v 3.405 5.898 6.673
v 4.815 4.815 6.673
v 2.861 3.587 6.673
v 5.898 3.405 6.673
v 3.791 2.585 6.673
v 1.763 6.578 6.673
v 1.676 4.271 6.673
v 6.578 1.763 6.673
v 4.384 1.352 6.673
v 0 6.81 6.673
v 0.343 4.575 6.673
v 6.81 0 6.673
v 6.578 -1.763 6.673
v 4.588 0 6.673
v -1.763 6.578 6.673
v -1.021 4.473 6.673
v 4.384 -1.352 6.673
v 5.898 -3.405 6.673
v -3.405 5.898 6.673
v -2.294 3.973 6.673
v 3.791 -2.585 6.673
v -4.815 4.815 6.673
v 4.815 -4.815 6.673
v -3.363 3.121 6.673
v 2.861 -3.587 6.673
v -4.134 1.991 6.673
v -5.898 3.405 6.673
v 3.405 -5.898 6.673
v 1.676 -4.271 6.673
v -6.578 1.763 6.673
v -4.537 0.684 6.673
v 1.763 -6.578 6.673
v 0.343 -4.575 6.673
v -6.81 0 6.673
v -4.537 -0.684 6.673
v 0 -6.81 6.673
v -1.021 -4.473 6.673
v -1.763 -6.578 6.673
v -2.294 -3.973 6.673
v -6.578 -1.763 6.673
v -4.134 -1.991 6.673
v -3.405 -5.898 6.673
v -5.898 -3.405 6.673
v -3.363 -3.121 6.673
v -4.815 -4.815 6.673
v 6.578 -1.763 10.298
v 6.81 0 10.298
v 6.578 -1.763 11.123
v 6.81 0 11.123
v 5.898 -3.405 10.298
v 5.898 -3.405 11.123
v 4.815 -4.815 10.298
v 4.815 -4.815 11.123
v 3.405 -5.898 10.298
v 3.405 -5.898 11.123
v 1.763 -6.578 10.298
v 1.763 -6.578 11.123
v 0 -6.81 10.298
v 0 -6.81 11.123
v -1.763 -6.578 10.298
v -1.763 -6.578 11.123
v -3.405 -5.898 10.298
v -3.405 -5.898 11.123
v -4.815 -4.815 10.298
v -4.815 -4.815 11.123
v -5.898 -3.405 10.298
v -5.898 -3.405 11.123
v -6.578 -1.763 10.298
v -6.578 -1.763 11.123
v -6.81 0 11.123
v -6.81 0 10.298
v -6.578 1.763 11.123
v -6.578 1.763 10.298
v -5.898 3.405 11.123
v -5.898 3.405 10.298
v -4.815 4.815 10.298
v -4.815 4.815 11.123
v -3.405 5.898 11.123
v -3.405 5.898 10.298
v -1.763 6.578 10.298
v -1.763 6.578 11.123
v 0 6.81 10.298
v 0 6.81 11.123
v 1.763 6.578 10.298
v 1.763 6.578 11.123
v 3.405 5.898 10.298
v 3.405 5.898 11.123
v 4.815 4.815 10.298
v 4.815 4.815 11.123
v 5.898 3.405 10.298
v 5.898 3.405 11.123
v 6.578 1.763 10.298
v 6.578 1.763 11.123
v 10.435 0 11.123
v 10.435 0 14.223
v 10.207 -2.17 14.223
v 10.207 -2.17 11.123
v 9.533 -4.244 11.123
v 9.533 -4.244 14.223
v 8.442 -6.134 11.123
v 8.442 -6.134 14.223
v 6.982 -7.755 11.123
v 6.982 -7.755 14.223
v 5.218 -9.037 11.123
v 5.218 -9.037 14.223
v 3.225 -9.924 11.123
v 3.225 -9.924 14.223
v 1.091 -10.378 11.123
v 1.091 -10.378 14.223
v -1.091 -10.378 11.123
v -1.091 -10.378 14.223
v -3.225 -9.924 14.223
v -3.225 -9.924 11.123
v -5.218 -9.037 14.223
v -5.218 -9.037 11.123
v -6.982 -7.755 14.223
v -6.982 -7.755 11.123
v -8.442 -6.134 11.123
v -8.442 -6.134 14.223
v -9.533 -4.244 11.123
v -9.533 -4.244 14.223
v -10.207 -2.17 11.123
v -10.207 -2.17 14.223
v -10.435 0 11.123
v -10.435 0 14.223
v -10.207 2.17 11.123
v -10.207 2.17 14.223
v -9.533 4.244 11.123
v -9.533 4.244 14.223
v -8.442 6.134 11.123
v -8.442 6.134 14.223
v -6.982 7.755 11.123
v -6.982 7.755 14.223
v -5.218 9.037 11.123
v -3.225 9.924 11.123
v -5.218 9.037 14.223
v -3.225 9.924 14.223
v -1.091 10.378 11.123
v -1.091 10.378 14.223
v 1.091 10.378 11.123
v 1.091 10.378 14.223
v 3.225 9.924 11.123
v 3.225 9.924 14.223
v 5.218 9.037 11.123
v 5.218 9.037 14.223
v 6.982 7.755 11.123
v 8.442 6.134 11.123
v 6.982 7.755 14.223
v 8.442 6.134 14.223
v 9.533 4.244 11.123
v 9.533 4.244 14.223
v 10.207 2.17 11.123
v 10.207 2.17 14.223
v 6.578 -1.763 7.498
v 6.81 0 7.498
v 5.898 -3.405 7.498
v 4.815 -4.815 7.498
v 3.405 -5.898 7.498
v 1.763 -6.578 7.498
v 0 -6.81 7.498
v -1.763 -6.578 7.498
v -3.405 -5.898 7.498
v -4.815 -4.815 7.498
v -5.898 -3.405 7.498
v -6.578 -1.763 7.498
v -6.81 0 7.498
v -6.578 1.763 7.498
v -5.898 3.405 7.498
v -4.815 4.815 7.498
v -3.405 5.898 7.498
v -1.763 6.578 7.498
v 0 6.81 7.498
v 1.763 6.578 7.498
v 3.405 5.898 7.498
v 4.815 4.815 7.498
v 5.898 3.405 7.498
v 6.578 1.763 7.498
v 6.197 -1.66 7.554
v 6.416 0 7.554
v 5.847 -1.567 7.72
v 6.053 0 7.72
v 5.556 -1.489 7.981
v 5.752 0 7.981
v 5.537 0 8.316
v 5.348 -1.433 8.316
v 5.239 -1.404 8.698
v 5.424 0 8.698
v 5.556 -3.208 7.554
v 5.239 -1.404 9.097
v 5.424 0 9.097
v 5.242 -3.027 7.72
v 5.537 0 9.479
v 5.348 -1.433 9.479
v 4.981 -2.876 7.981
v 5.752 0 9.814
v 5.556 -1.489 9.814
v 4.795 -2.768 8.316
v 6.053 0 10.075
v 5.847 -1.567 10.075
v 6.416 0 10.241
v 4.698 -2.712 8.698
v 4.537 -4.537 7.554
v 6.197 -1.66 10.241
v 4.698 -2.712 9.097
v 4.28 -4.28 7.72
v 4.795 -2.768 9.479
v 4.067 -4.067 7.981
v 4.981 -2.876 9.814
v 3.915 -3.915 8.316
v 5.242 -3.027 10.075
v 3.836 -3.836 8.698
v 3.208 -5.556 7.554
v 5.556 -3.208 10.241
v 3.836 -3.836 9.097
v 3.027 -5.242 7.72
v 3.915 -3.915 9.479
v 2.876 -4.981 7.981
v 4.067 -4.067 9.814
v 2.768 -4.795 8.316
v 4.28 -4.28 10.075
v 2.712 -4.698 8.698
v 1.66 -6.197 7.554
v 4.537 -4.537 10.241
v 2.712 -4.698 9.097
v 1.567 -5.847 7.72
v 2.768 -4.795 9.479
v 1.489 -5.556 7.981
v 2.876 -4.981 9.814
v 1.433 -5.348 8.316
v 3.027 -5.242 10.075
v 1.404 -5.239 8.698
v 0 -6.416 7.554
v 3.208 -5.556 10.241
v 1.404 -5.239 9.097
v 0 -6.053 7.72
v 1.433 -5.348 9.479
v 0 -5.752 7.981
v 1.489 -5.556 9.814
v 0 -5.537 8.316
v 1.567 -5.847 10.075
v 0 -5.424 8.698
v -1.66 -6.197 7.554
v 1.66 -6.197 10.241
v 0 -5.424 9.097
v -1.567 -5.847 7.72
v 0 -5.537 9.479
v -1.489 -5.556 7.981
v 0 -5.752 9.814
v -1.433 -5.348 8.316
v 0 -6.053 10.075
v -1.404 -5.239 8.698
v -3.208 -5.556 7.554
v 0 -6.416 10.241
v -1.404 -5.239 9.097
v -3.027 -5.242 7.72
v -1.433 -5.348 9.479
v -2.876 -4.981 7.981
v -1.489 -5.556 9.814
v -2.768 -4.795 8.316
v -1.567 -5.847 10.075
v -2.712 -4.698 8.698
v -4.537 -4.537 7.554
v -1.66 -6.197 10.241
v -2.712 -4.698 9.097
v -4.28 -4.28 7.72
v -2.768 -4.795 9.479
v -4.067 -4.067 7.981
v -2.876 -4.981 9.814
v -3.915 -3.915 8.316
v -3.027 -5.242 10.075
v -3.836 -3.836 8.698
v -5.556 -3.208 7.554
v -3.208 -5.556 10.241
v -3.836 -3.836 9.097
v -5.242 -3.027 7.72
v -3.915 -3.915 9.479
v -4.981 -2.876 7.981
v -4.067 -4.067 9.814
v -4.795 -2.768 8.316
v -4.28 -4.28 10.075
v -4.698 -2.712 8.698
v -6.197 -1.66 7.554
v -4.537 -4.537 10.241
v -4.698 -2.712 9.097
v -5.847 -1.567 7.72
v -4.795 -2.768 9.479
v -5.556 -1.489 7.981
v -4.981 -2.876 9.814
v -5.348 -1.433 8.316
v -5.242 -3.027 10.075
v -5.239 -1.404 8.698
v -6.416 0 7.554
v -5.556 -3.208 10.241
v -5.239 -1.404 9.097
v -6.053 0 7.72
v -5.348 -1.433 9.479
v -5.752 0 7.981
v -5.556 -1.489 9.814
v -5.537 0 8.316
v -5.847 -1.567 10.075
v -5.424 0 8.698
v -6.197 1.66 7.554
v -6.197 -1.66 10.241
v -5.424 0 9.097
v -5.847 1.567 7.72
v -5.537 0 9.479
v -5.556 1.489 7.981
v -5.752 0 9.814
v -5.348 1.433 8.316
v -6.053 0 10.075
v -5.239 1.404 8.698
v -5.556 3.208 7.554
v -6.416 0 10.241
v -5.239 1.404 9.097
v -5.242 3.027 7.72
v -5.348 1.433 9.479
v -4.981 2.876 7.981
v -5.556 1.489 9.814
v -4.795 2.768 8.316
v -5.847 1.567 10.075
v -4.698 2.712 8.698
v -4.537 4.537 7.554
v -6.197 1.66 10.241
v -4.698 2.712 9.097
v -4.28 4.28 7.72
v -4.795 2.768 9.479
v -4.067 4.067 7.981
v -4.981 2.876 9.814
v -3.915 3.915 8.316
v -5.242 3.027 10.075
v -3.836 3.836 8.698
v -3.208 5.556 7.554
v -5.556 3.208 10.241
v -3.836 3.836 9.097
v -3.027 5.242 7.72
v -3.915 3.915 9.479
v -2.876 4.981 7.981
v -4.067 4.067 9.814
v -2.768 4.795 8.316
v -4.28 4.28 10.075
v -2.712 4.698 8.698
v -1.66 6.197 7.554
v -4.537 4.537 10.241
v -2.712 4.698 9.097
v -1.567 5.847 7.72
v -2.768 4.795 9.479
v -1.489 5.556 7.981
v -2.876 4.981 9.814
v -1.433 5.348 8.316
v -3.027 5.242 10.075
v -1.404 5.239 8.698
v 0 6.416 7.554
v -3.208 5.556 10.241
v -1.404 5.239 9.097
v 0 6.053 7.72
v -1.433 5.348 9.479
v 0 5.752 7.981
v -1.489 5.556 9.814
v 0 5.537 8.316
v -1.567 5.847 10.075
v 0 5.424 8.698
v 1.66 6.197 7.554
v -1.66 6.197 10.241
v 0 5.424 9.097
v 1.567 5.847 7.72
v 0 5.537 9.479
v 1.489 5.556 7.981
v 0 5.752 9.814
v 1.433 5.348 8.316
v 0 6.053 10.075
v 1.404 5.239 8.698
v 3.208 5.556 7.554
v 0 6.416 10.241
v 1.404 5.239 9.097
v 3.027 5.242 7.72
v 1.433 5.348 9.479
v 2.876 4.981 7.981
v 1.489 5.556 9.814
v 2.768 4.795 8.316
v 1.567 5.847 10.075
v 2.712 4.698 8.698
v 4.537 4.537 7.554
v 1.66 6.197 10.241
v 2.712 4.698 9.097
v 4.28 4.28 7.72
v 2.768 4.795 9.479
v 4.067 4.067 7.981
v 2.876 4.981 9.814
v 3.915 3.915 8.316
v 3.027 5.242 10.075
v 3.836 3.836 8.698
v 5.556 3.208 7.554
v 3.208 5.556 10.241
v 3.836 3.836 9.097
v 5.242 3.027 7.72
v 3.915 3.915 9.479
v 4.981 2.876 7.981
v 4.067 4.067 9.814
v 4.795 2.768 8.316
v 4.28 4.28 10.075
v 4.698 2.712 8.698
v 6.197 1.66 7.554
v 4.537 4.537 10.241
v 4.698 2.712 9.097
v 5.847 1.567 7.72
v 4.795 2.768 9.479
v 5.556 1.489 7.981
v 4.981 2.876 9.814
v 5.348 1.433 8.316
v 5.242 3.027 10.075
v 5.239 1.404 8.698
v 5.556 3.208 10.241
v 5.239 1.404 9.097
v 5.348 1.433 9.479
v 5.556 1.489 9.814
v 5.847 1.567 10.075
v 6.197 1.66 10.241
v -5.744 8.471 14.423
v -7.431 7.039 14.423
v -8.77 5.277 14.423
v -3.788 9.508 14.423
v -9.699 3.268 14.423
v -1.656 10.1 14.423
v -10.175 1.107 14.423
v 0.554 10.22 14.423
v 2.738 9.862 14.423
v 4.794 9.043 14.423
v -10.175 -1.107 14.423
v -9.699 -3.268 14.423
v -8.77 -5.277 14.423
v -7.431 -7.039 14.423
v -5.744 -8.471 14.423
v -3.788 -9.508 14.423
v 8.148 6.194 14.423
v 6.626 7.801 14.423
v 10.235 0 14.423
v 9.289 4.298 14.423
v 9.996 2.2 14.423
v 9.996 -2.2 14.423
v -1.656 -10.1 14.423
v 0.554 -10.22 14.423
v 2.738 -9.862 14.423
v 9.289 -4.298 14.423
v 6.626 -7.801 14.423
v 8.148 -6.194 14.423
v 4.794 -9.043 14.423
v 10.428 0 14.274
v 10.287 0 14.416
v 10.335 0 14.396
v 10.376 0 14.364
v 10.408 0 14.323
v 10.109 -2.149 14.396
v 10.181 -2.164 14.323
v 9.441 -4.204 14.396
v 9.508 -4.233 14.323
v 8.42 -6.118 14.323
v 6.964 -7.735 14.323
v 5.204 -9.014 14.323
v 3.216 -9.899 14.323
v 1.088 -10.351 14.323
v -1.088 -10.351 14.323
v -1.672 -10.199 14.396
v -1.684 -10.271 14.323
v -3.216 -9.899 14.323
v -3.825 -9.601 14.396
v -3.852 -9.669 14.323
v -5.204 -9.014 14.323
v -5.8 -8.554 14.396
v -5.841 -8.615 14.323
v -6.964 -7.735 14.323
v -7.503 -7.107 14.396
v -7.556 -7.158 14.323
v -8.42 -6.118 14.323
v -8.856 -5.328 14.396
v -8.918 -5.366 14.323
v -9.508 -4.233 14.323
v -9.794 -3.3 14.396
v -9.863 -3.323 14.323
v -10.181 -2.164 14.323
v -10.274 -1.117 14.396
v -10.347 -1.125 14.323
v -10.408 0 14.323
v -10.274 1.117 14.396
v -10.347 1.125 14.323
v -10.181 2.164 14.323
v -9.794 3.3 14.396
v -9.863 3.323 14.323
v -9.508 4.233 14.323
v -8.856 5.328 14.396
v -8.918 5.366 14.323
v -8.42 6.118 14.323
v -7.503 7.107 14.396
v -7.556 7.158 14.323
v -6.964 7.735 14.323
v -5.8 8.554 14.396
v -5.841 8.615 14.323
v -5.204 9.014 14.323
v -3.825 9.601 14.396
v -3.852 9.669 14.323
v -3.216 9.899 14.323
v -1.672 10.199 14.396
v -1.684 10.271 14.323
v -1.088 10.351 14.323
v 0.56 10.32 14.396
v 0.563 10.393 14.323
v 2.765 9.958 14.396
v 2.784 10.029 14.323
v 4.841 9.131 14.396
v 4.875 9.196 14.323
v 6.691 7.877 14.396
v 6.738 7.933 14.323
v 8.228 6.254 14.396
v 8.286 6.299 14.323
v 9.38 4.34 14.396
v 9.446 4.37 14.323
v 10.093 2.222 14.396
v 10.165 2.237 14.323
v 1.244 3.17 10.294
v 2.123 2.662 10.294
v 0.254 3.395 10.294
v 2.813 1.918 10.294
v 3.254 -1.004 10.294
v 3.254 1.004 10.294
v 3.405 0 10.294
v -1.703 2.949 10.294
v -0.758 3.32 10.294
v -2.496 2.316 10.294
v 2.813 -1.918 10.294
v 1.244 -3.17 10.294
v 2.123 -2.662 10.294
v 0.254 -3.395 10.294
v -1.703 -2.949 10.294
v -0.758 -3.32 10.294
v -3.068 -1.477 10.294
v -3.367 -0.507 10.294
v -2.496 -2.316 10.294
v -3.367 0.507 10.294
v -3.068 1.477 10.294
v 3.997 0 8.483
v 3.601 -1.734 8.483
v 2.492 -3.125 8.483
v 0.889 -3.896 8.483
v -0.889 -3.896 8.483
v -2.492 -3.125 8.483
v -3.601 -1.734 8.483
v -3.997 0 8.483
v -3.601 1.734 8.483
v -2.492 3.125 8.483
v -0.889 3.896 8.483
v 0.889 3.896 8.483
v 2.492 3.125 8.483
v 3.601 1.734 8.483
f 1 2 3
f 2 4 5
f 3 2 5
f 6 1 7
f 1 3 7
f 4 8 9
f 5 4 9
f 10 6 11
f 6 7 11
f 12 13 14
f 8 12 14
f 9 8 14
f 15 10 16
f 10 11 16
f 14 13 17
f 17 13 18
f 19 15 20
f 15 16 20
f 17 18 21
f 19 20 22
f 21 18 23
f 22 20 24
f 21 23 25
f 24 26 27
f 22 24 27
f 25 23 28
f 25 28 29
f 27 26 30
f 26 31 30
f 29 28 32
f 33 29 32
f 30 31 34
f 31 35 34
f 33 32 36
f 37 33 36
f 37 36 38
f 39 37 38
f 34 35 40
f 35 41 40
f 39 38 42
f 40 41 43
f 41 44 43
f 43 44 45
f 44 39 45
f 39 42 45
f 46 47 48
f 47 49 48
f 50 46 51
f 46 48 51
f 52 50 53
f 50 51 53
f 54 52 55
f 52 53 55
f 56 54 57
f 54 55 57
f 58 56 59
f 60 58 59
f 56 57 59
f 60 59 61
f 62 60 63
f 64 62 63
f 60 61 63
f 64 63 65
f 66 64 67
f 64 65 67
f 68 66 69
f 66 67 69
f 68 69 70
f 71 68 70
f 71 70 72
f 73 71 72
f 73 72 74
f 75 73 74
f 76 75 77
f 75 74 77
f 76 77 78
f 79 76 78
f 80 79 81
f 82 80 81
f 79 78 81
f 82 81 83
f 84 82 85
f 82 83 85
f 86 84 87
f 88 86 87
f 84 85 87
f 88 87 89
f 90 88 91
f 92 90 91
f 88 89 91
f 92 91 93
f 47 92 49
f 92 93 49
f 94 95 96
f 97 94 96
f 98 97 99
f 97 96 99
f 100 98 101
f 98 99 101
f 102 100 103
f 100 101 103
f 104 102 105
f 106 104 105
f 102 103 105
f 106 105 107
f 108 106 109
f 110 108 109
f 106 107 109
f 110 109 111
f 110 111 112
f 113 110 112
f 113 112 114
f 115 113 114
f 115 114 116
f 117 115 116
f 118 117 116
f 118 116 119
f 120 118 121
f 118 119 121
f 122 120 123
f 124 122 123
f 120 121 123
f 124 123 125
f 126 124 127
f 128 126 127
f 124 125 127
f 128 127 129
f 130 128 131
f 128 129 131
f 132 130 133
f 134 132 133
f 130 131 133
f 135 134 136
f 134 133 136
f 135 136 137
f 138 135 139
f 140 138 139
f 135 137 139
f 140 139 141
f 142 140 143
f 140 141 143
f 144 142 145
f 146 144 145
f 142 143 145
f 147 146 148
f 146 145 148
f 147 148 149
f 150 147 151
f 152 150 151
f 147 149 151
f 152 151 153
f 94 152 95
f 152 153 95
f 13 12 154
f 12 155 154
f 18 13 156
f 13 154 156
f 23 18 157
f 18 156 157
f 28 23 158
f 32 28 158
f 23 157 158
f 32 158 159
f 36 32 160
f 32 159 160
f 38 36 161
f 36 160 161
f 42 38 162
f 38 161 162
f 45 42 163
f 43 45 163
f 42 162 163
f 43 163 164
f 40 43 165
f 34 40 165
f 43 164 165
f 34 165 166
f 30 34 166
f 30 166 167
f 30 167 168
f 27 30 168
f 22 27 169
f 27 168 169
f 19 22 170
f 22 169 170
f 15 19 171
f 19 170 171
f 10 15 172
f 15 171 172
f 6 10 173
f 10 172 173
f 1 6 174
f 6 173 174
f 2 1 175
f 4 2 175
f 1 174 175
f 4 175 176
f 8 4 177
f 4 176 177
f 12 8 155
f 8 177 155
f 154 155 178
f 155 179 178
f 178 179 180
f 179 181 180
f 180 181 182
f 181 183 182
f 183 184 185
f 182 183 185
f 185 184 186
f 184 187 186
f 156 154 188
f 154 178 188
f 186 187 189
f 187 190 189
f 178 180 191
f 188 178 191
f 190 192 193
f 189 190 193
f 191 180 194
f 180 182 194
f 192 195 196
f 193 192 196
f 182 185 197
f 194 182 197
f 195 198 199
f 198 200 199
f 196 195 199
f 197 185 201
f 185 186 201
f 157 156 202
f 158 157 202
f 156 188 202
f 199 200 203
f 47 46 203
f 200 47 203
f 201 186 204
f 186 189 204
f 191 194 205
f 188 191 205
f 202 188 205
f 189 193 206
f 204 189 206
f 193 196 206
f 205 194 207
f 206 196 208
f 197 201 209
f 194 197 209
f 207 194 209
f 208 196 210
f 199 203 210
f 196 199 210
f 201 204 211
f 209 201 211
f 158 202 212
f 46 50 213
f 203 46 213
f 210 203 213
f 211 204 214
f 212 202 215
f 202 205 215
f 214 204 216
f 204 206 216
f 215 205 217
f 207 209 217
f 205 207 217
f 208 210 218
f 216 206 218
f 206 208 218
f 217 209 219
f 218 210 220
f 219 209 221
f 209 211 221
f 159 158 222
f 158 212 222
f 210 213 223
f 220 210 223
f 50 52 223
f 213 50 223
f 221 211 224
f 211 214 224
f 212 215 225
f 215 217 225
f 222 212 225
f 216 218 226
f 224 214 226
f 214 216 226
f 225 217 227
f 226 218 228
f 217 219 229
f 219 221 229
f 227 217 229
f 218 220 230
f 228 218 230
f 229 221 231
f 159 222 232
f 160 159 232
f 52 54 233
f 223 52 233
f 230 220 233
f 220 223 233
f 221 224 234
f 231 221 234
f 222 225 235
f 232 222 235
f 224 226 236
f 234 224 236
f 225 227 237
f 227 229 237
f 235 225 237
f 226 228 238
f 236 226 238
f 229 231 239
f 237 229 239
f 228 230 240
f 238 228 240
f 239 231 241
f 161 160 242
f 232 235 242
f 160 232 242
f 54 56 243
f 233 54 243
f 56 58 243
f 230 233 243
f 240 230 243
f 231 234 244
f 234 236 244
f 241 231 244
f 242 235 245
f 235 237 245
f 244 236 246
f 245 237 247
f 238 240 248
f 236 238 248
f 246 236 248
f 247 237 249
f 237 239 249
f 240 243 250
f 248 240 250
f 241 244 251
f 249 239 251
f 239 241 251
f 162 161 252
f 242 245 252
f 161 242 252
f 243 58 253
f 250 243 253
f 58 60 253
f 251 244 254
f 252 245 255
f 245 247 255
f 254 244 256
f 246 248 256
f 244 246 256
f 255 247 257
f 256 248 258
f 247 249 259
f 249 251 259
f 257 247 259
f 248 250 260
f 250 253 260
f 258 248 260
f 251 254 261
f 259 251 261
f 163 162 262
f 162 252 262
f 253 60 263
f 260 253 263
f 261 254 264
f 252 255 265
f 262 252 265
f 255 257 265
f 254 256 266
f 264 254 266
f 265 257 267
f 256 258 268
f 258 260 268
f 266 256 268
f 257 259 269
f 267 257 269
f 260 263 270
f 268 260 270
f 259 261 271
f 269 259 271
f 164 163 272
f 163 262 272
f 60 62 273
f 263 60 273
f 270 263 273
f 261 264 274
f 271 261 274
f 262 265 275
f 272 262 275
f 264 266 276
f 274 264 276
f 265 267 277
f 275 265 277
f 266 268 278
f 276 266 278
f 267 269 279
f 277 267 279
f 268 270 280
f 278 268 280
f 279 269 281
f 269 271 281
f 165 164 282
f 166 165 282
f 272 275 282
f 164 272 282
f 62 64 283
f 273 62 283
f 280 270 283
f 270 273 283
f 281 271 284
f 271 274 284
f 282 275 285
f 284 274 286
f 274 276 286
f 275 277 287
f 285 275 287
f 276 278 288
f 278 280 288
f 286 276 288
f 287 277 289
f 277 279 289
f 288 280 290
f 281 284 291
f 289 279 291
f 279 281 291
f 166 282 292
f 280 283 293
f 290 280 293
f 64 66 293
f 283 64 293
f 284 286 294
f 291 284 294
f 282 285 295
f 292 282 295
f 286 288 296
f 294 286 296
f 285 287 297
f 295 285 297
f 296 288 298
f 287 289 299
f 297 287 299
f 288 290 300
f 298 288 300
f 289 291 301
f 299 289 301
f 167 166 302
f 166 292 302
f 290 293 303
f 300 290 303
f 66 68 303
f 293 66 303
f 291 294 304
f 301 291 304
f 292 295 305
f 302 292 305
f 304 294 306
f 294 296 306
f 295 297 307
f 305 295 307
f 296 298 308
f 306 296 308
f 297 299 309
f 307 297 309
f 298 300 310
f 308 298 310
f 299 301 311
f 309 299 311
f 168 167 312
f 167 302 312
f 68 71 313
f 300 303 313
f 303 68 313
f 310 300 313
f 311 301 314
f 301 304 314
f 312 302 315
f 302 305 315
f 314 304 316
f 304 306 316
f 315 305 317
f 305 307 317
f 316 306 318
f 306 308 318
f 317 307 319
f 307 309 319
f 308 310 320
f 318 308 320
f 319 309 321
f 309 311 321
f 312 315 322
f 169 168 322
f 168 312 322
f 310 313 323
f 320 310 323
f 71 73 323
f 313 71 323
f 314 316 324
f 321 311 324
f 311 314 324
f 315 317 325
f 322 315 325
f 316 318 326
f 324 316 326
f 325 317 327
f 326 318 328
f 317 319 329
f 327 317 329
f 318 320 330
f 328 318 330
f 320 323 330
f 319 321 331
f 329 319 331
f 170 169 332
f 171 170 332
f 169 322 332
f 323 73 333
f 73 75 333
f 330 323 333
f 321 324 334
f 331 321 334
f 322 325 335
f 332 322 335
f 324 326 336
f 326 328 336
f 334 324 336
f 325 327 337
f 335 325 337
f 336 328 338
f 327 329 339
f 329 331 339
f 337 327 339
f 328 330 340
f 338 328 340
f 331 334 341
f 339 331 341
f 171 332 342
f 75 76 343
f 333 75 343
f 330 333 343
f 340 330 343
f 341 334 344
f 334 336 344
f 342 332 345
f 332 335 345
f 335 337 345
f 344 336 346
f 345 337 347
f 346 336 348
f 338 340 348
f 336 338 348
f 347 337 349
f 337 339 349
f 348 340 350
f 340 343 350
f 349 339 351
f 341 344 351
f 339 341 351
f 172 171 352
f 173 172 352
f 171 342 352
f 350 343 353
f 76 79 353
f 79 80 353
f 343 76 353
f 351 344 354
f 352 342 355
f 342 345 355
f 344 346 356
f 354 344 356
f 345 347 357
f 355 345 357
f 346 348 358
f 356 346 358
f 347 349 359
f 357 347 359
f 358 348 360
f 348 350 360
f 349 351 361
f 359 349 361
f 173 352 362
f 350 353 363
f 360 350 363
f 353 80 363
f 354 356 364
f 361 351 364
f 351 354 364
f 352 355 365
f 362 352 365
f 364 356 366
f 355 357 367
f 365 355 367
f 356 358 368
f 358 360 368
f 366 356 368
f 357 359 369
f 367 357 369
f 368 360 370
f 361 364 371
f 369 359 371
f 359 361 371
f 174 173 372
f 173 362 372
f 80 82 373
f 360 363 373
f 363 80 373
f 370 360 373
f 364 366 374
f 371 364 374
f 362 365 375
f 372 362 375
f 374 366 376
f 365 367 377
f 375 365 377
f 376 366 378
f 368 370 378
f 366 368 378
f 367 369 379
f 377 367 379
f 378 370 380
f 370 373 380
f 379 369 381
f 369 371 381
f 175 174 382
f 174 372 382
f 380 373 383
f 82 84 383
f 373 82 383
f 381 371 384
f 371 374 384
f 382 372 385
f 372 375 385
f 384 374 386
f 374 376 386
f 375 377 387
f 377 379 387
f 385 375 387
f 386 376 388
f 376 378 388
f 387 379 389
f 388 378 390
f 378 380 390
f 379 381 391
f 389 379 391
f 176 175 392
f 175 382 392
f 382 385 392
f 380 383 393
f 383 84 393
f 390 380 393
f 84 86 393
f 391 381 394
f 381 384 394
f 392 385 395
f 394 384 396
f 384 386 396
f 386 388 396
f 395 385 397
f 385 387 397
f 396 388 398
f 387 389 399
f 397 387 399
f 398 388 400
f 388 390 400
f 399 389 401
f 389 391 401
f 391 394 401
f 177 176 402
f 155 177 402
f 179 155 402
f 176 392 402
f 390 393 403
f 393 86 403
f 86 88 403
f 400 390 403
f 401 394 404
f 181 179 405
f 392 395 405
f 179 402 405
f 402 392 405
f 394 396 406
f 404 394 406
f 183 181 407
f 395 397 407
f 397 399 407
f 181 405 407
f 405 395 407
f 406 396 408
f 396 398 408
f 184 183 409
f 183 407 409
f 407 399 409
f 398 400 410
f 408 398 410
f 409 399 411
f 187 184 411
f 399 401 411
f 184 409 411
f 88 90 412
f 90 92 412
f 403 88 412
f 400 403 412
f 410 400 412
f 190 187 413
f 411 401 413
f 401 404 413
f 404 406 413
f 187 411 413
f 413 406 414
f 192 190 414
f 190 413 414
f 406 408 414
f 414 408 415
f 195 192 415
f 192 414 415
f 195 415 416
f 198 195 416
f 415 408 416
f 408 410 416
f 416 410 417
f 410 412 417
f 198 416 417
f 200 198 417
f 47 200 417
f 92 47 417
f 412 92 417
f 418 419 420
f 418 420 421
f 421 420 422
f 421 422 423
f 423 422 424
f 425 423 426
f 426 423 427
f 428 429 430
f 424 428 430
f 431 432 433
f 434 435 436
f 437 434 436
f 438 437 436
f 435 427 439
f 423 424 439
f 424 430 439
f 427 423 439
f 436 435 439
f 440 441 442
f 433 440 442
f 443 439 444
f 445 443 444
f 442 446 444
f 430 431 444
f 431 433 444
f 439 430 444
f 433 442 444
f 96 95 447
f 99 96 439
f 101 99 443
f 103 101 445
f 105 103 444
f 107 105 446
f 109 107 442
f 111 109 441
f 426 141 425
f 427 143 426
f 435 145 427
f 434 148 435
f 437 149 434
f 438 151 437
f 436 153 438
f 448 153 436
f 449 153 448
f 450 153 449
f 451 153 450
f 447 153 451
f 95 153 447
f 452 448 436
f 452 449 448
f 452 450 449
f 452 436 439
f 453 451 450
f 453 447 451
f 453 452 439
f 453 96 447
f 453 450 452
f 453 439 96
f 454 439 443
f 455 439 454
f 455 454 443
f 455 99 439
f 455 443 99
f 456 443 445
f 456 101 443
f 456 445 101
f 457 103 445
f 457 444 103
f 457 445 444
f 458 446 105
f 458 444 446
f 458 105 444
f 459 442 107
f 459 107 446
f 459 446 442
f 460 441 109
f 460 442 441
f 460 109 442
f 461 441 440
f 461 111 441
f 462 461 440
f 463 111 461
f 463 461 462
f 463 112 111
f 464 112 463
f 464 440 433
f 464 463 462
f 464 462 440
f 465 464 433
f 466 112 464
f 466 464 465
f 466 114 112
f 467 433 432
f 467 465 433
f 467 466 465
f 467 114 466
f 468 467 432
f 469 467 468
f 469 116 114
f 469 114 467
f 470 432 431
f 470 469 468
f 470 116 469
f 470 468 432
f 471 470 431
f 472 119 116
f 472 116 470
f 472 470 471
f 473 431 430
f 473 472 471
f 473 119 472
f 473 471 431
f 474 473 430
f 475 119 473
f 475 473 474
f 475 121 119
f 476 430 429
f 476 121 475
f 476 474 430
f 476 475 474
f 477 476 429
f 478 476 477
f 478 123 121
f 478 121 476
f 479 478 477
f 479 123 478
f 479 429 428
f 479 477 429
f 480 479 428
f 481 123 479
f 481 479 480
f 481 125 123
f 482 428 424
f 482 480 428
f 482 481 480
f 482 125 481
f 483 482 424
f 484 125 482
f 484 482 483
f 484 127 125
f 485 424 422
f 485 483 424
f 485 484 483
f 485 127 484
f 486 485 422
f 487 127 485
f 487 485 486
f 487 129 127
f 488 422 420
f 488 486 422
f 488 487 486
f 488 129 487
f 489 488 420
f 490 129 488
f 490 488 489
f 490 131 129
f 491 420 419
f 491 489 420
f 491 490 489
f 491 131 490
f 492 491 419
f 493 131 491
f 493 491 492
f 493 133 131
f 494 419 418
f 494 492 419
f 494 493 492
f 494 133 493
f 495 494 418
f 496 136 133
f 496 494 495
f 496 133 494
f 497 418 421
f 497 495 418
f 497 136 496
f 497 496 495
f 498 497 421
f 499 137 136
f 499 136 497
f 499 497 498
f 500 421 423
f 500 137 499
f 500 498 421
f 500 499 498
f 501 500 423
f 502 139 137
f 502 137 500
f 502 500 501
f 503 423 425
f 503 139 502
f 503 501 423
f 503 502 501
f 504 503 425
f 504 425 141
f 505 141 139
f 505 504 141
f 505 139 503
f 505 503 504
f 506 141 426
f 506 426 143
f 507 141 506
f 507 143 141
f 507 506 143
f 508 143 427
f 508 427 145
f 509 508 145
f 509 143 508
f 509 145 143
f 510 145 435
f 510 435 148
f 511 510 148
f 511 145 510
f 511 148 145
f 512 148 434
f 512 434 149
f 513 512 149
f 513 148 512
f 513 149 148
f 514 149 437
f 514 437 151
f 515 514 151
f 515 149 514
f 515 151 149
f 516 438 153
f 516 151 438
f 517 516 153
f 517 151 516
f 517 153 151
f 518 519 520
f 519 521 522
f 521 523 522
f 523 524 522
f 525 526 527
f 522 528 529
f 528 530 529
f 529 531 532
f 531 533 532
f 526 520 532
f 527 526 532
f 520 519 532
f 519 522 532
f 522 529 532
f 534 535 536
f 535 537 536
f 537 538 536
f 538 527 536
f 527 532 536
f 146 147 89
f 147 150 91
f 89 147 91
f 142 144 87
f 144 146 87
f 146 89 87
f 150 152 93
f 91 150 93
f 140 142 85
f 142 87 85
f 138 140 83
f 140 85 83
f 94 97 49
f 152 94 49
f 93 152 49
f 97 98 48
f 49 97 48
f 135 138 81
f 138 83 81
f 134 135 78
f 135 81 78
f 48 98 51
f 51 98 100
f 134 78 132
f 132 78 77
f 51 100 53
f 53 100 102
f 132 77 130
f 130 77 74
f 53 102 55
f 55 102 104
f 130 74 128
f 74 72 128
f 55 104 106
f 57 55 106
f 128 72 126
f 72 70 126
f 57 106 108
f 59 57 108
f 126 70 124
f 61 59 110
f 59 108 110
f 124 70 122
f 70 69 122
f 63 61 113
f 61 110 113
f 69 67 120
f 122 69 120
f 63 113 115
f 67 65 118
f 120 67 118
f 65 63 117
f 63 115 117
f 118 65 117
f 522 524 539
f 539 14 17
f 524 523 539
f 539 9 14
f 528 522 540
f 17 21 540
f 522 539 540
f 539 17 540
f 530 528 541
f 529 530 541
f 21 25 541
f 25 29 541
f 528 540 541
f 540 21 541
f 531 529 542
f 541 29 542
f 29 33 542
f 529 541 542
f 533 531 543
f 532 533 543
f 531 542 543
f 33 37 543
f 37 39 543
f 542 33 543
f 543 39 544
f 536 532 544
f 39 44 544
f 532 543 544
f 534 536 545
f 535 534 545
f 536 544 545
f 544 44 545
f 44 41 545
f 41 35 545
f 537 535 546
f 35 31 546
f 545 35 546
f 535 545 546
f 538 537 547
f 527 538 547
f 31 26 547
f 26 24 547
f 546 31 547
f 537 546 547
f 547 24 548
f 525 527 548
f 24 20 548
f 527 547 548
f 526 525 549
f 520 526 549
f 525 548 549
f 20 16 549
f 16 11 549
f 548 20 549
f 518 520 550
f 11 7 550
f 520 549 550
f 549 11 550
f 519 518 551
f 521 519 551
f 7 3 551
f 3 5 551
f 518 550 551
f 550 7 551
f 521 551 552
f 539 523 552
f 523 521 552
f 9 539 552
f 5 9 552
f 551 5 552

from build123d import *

# Parameters (mm, degrees)
F2_R = 0.2


with BuildPart() as f1:
    # F0 (on Front) → F1 (revolve)
    with BuildSketch(Plane.XZ):
        with BuildLine():
            Line((10.435, 14.422704), (0, 14.422704))
            Line((0, 14.422704), (0, 10.294014))
            Line((0, 10.294014), (3.405, 10.294014))
            Line((3.405, 10.294014), (4.58817, 6.672704))
            Line((4.58817, 6.672704), (6.81, 6.672704))
            Line((6.81, 6.672704), (6.81, 7.497758))
            ThreePointArc((6.81, 7.497758), (5.410053, 8.897704), (6.81, 10.297651))
            Line((6.81, 10.297651), (6.81, 11.122704))
            Line((6.81, 11.122704), (10.435, 11.122704))
            Line((10.435, 11.122704), (10.435, 14.422704))
        make_face()
    revolve(axis=Axis((0, 0, 6.85568), (0, 0, -1)))

    # F2
    f2_edges = [f1.edges().sort_by_distance(p)[0] for p in [
        (-10.435, 0, 14.422704),
    ]]
    fillet(f2_edges, radius=F2_R)


solid = f1.part
